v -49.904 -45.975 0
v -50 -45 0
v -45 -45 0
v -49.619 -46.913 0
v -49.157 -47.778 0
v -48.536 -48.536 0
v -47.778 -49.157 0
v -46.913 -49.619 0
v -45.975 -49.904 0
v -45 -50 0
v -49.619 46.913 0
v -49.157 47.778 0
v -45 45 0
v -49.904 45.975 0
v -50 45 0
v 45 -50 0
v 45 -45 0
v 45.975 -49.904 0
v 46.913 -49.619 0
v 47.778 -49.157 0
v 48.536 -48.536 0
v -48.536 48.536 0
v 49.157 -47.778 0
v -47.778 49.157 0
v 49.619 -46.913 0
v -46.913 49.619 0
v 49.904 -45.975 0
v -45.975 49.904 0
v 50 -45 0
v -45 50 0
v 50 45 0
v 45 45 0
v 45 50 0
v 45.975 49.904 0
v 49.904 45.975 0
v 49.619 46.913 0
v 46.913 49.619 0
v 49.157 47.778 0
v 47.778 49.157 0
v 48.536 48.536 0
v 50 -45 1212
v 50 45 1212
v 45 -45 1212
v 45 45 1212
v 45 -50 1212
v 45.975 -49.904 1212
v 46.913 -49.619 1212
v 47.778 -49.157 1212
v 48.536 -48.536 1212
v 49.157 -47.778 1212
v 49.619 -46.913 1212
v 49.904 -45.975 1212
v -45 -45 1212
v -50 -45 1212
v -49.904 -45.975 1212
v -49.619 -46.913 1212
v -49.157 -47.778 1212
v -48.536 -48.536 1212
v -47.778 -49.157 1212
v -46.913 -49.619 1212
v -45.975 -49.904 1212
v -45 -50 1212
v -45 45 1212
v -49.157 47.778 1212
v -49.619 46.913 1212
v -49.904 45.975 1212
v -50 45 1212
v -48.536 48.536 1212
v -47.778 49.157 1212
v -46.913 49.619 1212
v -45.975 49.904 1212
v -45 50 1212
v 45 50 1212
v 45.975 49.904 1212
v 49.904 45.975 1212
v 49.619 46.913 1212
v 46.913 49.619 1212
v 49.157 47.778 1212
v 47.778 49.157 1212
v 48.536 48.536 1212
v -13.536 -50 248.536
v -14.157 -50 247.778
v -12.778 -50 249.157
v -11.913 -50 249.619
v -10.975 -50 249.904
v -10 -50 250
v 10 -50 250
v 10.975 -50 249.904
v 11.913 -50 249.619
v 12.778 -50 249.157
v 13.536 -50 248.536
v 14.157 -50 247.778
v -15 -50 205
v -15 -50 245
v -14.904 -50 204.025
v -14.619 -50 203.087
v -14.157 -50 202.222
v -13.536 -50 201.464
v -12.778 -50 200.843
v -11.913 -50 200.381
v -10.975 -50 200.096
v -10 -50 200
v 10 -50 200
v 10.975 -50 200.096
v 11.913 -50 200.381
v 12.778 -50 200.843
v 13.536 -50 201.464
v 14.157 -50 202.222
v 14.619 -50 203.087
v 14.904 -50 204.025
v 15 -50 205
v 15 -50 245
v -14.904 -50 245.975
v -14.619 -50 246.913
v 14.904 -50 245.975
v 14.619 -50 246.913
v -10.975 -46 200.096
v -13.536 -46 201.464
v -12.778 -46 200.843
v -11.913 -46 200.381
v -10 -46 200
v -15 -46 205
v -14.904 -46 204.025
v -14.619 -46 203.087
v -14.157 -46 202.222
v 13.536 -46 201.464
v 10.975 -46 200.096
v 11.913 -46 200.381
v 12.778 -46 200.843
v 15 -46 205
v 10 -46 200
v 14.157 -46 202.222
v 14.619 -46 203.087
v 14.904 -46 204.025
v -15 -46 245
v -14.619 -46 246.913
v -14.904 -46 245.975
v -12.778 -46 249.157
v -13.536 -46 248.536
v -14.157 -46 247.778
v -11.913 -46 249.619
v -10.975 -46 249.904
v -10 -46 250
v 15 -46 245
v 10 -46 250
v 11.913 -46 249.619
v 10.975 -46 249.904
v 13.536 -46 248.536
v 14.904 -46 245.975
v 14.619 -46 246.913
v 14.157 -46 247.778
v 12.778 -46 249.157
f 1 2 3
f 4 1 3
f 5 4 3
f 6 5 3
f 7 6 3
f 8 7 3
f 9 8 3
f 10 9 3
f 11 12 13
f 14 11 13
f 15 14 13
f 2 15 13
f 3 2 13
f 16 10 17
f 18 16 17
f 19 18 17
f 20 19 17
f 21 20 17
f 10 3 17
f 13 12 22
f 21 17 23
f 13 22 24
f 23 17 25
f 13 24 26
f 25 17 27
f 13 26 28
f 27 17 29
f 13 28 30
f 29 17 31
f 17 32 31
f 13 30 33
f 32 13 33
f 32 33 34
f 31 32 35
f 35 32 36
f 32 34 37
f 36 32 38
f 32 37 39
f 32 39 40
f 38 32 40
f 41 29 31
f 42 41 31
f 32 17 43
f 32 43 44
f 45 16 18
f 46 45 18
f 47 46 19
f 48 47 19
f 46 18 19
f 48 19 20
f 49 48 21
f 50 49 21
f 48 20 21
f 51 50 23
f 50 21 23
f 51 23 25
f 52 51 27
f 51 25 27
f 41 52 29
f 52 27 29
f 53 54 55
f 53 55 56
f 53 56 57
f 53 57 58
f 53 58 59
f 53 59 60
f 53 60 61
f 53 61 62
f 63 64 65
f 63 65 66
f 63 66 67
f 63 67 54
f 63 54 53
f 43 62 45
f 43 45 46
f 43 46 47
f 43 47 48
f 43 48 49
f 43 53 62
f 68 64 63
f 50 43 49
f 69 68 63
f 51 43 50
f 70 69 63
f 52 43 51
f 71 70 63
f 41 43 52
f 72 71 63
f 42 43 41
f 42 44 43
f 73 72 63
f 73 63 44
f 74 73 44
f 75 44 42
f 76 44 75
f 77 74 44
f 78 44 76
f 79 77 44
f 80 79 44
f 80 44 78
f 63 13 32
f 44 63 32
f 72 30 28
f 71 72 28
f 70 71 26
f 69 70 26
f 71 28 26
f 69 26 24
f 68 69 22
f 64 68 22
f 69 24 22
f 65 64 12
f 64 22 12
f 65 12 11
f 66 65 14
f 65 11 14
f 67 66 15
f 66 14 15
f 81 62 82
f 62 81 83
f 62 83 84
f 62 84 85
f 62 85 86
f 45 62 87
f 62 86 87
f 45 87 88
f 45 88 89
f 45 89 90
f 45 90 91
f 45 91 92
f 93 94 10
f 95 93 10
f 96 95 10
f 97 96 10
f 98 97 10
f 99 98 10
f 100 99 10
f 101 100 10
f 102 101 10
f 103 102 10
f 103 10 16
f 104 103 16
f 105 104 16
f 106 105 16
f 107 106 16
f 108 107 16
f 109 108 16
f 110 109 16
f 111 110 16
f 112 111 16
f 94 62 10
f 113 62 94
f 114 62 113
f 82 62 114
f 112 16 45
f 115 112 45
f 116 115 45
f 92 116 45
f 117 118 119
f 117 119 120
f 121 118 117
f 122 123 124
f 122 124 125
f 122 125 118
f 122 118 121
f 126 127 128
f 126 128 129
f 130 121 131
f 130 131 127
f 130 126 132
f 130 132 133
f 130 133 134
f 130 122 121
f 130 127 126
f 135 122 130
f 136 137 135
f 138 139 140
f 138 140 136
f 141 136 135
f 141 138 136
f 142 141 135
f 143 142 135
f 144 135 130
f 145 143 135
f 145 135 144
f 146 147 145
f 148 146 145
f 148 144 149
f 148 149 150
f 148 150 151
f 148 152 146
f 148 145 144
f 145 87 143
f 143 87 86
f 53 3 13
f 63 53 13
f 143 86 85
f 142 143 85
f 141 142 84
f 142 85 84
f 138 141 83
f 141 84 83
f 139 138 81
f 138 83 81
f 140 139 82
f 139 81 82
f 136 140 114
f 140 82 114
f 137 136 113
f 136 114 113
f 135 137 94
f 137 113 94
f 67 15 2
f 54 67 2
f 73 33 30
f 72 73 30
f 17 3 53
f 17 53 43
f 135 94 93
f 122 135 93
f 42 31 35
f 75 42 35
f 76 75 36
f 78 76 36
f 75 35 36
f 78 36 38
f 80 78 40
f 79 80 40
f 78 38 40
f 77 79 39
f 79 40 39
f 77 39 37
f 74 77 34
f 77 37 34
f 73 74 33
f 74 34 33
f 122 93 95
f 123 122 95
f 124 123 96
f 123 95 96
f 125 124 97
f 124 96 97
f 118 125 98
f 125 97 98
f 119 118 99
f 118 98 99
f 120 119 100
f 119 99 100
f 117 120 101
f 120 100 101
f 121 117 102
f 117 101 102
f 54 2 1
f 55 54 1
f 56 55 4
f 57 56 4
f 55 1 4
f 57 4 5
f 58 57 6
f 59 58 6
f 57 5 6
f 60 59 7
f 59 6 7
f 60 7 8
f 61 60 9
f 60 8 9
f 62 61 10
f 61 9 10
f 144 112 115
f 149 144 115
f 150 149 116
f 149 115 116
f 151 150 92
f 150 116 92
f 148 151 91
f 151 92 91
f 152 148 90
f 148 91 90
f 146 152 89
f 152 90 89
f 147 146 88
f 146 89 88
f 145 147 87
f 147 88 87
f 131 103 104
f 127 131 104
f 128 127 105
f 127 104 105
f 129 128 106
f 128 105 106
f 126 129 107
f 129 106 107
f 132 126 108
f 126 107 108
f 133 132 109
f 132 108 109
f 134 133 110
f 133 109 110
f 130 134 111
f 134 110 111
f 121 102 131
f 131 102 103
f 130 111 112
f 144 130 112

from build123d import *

# Parameters (mm, degrees)
F0_W     = 90
F0_H     = 90
F1_DEPTH = 1212
F3_DEPTH = 4


with BuildPart() as f1:
    # F0 (on Top) → F1 (new body)
    with BuildSketch(Plane.XY):
        with BuildLine():
            ThreePointArc((50, 45), (48.535534, 48.535534), (45, 50))
            Line((45, 50), (-45, 50))
            ThreePointArc((-45, 50), (-48.535534, 48.535534), (-50, 45))
            Line((-50, 45), (-50, -45))
            ThreePointArc((-50, -45), (-48.535534, -48.535534), (-45, -50))
            Line((-45, -50), (45, -50))
            ThreePointArc((45, -50), (48.535534, -48.535534), (50, -45))
            Line((50, -45), (50, 45))
        make_face()
        Rectangle(F0_W, F0_H, mode=Mode.SUBTRACT)
    extrude(amount=F1_DEPTH)

    # F2 (on face) → F3 (cut)
    with BuildSketch(Plane.XZ.offset(50)):
        with BuildLine():
            ThreePointArc((-15, 205), (-13.535534, 201.464466), (-10, 200))
            Line((-10, 200), (10, 200))
            ThreePointArc((10, 200), (13.535534, 201.464466), (15, 205))
            Line((15, 205), (15, 245))
            ThreePointArc((15, 245), (13.535534, 248.535534), (10, 250))
            Line((10, 250), (-10, 250))
            ThreePointArc((-10, 250), (-13.535534, 248.535534), (-15, 245))
            Line((-15, 245), (-15, 205))
        make_face()
    extrude(amount=-F3_DEPTH, mode=Mode.SUBTRACT)


solid = f1.part
